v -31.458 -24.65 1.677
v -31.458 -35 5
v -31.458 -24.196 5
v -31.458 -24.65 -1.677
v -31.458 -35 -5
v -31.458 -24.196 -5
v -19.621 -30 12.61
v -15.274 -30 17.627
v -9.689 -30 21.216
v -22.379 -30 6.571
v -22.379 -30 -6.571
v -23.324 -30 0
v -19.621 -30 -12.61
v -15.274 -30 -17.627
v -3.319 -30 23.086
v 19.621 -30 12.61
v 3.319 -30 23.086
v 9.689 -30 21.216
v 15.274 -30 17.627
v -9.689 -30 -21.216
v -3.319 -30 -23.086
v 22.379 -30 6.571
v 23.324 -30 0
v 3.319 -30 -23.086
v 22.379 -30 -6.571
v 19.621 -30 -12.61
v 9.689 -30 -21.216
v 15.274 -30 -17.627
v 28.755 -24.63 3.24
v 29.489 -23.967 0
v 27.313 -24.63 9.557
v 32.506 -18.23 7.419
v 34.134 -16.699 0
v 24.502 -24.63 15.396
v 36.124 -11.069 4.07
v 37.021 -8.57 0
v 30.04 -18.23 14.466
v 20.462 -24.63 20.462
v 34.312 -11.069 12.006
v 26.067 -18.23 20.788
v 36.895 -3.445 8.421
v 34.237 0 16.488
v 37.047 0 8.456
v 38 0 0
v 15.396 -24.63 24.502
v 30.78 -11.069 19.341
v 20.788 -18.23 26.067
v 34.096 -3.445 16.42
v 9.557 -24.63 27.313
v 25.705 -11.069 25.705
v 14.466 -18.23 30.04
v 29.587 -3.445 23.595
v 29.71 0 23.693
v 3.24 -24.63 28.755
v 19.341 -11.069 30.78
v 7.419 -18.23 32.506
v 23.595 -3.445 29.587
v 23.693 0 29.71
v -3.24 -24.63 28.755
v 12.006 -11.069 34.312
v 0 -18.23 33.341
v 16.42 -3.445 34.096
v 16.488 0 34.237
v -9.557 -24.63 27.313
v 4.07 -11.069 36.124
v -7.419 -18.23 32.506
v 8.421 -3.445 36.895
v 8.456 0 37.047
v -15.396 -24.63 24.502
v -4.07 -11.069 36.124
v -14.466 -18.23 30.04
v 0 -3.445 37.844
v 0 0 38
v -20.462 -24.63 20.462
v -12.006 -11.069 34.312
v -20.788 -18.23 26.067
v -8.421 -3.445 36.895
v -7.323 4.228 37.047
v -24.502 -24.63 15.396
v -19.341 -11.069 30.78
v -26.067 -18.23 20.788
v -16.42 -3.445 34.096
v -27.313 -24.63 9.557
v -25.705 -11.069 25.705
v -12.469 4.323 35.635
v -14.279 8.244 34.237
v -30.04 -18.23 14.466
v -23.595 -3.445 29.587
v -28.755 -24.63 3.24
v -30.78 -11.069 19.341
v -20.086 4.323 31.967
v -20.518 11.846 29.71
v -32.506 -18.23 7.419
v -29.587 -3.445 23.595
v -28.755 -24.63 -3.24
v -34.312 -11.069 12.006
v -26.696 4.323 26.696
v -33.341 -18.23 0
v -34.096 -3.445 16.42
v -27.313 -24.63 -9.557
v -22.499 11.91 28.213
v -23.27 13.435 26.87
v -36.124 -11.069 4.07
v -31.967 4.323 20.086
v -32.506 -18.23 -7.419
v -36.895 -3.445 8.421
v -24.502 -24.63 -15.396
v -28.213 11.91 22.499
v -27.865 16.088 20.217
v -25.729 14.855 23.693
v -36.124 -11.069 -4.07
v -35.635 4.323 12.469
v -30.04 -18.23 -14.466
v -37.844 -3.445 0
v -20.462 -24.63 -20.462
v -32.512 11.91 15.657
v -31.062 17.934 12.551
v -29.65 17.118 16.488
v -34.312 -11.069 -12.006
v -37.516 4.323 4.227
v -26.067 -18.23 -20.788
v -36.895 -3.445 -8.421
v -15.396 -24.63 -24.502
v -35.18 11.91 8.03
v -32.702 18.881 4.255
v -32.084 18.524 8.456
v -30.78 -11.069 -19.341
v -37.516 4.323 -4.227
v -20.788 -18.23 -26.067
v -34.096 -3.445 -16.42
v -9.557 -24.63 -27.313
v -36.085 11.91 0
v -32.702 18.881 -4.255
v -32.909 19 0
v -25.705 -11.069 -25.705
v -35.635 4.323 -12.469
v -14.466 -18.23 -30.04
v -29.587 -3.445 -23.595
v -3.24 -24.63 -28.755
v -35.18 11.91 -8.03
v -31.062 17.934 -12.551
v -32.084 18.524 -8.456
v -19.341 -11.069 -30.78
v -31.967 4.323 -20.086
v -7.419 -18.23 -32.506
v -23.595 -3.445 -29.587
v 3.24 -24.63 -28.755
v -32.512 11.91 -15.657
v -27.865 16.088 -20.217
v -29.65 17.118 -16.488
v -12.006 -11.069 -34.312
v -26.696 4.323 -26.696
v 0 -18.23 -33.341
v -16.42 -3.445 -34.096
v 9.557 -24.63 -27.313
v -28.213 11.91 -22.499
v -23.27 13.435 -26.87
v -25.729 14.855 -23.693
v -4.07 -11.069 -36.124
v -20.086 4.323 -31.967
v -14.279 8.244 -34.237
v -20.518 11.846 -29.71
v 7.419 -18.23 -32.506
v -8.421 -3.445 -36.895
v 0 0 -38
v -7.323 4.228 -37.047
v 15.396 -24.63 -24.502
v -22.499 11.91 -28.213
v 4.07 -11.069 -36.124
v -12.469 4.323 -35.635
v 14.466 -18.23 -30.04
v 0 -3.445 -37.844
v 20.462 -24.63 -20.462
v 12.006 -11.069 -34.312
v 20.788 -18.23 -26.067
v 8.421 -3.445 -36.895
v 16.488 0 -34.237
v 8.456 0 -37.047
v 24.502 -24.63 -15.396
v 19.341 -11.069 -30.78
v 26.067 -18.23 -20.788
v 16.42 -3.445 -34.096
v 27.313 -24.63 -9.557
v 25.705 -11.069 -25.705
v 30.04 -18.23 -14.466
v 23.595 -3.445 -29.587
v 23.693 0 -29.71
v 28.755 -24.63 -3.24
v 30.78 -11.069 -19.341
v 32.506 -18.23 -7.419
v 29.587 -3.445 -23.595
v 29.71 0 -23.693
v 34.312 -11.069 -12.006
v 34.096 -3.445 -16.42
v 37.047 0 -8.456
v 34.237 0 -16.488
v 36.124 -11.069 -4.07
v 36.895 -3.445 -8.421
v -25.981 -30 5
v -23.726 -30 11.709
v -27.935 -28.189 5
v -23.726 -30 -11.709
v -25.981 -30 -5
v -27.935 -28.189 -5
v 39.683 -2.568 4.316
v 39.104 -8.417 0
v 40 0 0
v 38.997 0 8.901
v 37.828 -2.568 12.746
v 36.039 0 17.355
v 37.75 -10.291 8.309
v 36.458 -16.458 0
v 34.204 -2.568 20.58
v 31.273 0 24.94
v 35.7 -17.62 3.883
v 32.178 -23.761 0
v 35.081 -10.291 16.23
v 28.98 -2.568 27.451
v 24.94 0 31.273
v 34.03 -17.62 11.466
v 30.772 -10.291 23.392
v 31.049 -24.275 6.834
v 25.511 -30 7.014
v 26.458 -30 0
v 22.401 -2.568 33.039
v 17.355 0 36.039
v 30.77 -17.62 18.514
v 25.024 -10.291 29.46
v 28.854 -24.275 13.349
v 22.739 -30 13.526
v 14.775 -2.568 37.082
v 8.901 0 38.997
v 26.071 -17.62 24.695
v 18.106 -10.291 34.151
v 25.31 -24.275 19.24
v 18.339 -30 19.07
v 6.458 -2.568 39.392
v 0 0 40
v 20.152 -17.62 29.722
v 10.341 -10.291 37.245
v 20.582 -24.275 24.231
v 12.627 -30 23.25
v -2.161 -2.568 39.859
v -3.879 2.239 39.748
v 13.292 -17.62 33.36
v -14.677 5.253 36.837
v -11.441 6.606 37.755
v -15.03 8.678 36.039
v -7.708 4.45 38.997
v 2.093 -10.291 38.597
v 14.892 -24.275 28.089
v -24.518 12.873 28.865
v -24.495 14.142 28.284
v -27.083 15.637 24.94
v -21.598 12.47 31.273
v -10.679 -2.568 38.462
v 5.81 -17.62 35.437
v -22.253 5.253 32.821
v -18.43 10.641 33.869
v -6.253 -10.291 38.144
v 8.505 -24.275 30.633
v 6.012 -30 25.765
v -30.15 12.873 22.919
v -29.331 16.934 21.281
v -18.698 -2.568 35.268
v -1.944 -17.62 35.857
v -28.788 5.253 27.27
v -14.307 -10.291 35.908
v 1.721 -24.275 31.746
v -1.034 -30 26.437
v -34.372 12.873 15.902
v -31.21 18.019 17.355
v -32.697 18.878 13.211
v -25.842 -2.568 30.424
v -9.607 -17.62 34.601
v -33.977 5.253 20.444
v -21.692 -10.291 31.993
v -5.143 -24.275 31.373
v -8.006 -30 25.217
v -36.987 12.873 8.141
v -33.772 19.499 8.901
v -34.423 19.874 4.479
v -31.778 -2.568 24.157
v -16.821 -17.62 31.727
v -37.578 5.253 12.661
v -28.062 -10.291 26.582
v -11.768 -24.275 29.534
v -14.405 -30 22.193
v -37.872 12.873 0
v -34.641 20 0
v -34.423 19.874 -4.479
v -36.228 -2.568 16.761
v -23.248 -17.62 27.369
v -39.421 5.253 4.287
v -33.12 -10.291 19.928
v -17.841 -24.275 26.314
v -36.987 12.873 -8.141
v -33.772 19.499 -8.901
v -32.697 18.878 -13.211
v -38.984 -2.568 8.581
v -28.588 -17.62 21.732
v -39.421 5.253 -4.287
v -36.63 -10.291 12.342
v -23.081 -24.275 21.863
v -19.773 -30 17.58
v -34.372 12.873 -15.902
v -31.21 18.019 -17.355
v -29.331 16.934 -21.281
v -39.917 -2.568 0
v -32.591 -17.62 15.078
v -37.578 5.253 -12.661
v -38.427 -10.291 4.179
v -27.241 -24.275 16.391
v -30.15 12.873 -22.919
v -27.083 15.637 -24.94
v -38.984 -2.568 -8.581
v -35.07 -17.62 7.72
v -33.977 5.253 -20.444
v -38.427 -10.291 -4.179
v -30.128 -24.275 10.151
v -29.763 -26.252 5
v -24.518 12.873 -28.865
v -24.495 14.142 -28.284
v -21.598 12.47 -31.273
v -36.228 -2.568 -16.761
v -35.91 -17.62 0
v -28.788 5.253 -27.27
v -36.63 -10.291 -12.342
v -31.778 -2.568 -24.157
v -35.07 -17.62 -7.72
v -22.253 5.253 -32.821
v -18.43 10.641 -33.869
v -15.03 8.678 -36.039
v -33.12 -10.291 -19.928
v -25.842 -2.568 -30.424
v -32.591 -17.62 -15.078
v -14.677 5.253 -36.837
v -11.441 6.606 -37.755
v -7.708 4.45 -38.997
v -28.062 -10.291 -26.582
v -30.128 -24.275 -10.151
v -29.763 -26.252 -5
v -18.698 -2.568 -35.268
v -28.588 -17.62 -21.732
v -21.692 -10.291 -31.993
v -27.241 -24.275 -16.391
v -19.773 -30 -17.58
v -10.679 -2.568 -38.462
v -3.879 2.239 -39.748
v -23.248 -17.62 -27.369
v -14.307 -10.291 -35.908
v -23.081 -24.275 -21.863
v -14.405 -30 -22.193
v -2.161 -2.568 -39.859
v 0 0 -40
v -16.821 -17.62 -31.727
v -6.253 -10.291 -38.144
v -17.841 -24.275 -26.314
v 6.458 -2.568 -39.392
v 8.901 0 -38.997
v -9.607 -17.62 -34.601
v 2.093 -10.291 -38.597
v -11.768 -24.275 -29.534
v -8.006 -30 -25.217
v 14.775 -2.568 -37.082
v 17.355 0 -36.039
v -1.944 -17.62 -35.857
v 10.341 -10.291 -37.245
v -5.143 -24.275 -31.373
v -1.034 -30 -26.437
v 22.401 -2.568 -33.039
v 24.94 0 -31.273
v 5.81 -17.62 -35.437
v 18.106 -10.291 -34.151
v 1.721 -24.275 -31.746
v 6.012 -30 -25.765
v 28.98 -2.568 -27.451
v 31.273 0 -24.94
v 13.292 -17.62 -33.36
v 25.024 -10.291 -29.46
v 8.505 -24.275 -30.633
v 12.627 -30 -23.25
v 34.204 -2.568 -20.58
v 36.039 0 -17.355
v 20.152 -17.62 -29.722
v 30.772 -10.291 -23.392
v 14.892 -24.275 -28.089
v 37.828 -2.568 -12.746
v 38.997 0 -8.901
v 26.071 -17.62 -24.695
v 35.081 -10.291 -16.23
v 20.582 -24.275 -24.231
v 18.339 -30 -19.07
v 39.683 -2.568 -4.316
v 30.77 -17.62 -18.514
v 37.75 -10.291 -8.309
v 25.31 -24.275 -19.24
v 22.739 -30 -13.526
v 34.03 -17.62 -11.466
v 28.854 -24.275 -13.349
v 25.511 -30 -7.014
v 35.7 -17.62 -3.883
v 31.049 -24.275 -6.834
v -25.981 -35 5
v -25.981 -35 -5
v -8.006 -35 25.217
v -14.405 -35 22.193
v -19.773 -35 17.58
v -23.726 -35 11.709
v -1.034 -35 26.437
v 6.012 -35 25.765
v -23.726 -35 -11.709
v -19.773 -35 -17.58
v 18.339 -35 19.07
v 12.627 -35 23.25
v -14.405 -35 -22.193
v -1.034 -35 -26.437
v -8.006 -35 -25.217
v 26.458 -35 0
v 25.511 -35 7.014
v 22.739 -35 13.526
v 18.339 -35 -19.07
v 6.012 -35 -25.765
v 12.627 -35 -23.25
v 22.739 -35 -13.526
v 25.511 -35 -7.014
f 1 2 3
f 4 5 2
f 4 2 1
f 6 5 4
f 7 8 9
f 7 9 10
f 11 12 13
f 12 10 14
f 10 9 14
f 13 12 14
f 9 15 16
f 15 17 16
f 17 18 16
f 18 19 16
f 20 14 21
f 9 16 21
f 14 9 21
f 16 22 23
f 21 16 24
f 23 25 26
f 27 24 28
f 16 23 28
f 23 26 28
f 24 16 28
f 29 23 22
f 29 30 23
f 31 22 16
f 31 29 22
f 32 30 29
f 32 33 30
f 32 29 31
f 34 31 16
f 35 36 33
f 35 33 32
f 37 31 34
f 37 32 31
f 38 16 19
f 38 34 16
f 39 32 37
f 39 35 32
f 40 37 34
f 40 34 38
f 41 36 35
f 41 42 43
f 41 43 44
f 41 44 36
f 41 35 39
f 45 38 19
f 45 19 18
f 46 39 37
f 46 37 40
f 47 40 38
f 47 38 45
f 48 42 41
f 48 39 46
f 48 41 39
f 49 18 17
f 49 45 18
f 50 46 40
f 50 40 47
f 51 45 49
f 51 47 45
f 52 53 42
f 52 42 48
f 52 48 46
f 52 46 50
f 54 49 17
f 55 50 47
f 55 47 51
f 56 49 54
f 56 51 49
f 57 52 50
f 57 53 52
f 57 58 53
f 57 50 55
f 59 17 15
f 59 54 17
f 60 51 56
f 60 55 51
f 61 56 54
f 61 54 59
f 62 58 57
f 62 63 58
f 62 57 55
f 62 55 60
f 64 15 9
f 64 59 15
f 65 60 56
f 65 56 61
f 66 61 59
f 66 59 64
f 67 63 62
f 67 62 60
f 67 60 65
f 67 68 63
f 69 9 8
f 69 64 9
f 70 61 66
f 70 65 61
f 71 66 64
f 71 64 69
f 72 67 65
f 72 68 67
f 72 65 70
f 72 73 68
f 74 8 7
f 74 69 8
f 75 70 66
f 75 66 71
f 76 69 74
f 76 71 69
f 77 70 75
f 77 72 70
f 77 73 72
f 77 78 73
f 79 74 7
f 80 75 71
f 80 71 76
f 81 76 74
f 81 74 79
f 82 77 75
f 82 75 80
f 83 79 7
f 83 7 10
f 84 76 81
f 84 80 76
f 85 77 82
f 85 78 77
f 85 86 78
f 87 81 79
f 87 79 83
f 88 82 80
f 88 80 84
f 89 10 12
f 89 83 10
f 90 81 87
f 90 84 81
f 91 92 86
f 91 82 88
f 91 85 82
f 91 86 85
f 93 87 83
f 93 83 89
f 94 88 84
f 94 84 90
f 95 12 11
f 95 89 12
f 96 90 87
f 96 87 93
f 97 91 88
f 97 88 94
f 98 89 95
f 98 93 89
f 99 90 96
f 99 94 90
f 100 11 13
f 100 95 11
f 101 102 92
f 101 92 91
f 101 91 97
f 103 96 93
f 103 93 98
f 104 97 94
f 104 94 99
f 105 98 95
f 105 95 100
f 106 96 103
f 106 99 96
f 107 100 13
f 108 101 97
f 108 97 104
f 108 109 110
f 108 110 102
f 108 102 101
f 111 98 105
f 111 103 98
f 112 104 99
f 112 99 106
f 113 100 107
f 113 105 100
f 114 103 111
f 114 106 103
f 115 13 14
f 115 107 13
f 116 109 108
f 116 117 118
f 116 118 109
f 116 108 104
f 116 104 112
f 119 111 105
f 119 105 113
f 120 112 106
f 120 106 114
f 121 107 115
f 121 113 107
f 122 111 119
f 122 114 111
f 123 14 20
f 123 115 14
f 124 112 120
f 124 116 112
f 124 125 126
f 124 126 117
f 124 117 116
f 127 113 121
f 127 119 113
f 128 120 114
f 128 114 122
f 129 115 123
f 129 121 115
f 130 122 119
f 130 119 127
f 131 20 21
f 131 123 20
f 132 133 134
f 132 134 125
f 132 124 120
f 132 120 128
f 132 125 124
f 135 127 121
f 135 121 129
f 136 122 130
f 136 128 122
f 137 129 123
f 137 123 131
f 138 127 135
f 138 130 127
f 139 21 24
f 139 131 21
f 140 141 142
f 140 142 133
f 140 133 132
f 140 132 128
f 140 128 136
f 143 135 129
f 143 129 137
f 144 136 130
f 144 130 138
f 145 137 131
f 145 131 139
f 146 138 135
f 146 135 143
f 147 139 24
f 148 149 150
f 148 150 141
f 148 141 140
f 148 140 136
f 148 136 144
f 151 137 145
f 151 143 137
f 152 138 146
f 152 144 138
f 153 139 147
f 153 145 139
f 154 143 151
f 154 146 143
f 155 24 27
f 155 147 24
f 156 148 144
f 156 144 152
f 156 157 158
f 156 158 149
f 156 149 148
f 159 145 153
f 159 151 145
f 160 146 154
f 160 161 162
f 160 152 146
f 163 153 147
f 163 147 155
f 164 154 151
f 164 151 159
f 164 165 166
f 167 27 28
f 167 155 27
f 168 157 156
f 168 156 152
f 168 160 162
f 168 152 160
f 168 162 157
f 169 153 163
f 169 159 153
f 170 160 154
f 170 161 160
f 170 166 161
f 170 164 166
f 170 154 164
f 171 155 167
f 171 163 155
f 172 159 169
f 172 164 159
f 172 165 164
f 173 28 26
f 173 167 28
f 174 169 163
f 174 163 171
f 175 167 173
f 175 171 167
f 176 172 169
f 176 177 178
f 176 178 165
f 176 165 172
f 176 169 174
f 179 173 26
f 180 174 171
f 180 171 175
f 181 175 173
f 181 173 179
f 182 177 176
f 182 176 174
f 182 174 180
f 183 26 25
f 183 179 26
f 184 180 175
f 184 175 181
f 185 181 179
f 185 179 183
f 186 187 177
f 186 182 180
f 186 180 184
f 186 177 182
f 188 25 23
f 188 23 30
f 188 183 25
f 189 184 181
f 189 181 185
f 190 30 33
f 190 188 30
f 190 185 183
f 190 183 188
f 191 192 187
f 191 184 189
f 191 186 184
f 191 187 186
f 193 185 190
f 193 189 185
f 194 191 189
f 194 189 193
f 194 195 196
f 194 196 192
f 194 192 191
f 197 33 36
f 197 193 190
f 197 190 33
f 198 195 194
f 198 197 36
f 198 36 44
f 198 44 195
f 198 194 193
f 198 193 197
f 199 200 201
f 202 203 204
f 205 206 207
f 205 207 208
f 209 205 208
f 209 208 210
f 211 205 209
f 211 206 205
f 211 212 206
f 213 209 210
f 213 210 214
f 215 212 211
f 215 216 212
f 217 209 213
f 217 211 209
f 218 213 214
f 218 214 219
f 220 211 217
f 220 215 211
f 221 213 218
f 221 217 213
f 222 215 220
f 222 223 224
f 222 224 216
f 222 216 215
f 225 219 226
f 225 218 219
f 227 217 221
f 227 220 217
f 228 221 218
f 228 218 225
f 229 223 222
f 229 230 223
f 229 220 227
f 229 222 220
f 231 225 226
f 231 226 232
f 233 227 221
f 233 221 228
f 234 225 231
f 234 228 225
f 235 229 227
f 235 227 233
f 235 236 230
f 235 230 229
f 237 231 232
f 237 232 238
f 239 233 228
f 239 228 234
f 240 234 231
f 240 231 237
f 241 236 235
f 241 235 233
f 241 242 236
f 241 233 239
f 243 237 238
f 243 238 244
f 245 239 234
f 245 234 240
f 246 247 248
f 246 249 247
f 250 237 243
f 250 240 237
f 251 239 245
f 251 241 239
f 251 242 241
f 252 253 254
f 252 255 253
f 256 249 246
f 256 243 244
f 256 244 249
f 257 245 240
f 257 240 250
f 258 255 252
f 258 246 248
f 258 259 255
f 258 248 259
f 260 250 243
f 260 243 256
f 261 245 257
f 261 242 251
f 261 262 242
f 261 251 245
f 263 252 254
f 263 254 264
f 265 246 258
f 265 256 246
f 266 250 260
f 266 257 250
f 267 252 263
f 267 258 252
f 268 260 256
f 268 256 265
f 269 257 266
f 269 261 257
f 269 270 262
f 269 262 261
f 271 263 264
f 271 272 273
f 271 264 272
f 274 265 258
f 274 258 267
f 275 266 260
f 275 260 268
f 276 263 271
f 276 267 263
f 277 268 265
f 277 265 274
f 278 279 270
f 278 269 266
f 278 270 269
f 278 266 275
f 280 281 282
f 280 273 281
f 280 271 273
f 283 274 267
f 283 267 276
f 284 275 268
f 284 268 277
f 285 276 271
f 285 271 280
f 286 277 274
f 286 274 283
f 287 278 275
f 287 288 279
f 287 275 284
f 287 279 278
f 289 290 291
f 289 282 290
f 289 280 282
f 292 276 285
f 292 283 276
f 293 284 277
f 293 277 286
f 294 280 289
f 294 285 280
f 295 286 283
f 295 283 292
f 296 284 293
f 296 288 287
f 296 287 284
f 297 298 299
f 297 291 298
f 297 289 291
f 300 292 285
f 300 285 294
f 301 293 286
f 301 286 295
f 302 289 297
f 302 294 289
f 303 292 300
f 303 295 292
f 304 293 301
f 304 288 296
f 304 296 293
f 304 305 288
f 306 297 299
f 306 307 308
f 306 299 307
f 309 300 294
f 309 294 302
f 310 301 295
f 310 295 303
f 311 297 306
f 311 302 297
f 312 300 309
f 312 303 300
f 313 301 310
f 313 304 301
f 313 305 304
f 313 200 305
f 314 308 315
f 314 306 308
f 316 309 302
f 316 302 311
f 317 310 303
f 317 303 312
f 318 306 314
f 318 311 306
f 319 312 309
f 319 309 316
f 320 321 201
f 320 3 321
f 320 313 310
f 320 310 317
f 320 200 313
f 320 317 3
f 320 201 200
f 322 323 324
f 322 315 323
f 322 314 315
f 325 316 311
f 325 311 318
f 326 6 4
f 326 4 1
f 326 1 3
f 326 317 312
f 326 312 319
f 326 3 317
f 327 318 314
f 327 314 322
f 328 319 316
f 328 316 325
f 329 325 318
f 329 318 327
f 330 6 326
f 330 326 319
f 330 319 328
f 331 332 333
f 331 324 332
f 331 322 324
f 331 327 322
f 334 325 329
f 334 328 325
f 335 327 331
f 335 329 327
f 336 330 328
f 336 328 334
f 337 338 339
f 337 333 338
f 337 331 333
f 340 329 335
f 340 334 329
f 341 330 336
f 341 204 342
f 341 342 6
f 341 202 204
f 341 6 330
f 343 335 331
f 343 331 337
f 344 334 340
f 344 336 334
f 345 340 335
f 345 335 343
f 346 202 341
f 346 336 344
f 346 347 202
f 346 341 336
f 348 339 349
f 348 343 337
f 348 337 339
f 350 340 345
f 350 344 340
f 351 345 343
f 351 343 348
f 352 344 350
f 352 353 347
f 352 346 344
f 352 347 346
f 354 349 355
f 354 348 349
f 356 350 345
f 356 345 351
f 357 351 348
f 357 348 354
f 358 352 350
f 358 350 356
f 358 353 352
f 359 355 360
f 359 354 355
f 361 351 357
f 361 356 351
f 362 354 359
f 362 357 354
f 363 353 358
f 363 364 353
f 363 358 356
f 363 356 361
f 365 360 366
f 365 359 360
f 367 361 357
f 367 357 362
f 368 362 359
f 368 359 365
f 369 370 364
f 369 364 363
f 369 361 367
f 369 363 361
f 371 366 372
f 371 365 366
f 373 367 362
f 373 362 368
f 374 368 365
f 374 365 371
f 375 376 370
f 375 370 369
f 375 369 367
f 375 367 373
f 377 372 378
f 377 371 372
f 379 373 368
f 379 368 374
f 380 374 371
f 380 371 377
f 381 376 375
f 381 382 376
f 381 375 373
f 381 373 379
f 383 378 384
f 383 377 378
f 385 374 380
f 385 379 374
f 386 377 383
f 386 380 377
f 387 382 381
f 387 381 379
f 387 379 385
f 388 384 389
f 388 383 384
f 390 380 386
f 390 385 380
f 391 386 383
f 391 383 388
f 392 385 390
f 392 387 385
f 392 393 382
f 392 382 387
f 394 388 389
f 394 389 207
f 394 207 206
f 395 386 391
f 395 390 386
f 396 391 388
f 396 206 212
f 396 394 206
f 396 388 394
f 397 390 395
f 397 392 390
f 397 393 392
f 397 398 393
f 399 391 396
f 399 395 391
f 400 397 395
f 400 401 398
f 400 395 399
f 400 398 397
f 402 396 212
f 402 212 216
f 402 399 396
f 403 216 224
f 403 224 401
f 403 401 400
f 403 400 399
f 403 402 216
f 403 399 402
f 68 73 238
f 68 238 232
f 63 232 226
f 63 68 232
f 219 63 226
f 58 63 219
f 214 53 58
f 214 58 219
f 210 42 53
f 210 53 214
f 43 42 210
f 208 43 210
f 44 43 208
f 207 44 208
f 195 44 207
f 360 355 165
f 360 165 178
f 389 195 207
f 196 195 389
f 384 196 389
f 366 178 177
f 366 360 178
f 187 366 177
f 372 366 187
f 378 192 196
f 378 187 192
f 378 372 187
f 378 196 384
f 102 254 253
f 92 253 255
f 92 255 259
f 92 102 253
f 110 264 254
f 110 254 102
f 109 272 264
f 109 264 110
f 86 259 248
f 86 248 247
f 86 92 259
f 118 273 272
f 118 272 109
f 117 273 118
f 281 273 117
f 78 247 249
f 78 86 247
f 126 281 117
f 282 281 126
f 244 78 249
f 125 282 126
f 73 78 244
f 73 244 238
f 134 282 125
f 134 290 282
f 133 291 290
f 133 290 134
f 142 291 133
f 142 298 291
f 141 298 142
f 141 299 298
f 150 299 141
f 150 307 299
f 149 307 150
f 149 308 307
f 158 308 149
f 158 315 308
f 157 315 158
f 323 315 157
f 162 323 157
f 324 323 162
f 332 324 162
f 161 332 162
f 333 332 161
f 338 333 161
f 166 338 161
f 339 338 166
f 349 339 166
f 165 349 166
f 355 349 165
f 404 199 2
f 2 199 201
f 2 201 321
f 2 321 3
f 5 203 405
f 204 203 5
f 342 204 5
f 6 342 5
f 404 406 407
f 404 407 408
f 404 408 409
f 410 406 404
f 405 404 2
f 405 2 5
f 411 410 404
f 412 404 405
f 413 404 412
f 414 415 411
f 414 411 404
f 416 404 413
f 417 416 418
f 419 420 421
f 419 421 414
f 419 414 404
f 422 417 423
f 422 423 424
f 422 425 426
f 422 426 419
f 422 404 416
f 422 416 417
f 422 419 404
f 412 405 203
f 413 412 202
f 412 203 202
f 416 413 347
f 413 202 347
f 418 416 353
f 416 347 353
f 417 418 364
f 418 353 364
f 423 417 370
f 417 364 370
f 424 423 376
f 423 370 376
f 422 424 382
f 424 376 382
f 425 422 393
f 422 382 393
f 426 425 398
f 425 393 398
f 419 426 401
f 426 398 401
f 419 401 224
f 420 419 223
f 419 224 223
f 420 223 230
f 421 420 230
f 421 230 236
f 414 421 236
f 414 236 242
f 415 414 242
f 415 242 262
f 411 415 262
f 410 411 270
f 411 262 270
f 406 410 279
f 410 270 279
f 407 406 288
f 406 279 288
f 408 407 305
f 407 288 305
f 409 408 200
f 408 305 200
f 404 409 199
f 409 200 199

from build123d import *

# Parameters (mm, degrees)
KES_EKSTR_ZYON1_DEPTH            = 70.282032303
KES_EKSTR_ZYON1_DEPTH_BACK       = 70.282032303
IZIM2_W                          = 52.915026222
IZIM2_H                          = 20
IZIM4_R                          = 26.457513111
Y_KSEKLIK_EKSTR_ZYON1_DEPTH      = 5
Y_KSEKLIK_EKSTR_ZYON5_DEPTH      = 5
Y_KSEKLIK_EKSTR_ZYON5_DEPTH_BACK = 5


with BuildPart() as part:
    # Çizim1 → Döndür1 (revolve)
    with BuildSketch(Plane.XY):
        with BuildLine():
            Line((0, 38), (0, 40))
            ThreePointArc((0, 40), (40, 0), (0, -40))
            Line((0, -40), (0, -38))
            ThreePointArc((0, -38), (38, 0), (0, 38))
        make_face()
    revolve(axis=Axis((0, 48.642187878, 0), (0, -1, 0)))

    # Çizim2 → Kes-Ekstrüzyon1 (cut, two sides: drawn at the far end of the back side and taken through both)
    with BuildSketch(Plane.XY.offset(-KES_EKSTR_ZYON1_DEPTH_BACK)):
        with BuildLine():
            Line((0, 0), (40, 0))
            ThreePointArc((40, 0), (10.352761804, 38.637033052), (-34.641016151, 20))
            Line((-34.641016151, 20), (0, 0))
        make_face()
        with Locations((0, -40)):
            Rectangle(IZIM2_W, IZIM2_H)
    extrude(amount=KES_EKSTR_ZYON1_DEPTH + KES_EKSTR_ZYON1_DEPTH_BACK, mode=Mode.SUBTRACT)

    # Çizim4 → Yükseklik-Ekstrüzyon1 (add)
    with BuildSketch(Plane.XZ.offset(30)):
        Circle(IZIM4_R)
    extrude(amount=Y_KSEKLIK_EKSTR_ZYON1_DEPTH)

    # Çizim13 → Yükseklik-Ekstrüzyon5 (add, two sides: drawn at the far end of the back side and taken through both)
    with BuildSketch(Plane.XY.offset(-Y_KSEKLIK_EKSTR_ZYON5_DEPTH_BACK)):
        with BuildLine():
            Line((-17.204650534, -35), (-31.457513111, -35))
            Line((-31.457513111, -35), (-31.457513111, -23.05265427))
            ThreePointArc((-31.457513111, -23.05265427), (-25.053668597, -29.88835375), (-17.204650534, -35))
        make_face()
    extrude(amount=Y_KSEKLIK_EKSTR_ZYON5_DEPTH + Y_KSEKLIK_EKSTR_ZYON5_DEPTH_BACK)


solid = part.part
